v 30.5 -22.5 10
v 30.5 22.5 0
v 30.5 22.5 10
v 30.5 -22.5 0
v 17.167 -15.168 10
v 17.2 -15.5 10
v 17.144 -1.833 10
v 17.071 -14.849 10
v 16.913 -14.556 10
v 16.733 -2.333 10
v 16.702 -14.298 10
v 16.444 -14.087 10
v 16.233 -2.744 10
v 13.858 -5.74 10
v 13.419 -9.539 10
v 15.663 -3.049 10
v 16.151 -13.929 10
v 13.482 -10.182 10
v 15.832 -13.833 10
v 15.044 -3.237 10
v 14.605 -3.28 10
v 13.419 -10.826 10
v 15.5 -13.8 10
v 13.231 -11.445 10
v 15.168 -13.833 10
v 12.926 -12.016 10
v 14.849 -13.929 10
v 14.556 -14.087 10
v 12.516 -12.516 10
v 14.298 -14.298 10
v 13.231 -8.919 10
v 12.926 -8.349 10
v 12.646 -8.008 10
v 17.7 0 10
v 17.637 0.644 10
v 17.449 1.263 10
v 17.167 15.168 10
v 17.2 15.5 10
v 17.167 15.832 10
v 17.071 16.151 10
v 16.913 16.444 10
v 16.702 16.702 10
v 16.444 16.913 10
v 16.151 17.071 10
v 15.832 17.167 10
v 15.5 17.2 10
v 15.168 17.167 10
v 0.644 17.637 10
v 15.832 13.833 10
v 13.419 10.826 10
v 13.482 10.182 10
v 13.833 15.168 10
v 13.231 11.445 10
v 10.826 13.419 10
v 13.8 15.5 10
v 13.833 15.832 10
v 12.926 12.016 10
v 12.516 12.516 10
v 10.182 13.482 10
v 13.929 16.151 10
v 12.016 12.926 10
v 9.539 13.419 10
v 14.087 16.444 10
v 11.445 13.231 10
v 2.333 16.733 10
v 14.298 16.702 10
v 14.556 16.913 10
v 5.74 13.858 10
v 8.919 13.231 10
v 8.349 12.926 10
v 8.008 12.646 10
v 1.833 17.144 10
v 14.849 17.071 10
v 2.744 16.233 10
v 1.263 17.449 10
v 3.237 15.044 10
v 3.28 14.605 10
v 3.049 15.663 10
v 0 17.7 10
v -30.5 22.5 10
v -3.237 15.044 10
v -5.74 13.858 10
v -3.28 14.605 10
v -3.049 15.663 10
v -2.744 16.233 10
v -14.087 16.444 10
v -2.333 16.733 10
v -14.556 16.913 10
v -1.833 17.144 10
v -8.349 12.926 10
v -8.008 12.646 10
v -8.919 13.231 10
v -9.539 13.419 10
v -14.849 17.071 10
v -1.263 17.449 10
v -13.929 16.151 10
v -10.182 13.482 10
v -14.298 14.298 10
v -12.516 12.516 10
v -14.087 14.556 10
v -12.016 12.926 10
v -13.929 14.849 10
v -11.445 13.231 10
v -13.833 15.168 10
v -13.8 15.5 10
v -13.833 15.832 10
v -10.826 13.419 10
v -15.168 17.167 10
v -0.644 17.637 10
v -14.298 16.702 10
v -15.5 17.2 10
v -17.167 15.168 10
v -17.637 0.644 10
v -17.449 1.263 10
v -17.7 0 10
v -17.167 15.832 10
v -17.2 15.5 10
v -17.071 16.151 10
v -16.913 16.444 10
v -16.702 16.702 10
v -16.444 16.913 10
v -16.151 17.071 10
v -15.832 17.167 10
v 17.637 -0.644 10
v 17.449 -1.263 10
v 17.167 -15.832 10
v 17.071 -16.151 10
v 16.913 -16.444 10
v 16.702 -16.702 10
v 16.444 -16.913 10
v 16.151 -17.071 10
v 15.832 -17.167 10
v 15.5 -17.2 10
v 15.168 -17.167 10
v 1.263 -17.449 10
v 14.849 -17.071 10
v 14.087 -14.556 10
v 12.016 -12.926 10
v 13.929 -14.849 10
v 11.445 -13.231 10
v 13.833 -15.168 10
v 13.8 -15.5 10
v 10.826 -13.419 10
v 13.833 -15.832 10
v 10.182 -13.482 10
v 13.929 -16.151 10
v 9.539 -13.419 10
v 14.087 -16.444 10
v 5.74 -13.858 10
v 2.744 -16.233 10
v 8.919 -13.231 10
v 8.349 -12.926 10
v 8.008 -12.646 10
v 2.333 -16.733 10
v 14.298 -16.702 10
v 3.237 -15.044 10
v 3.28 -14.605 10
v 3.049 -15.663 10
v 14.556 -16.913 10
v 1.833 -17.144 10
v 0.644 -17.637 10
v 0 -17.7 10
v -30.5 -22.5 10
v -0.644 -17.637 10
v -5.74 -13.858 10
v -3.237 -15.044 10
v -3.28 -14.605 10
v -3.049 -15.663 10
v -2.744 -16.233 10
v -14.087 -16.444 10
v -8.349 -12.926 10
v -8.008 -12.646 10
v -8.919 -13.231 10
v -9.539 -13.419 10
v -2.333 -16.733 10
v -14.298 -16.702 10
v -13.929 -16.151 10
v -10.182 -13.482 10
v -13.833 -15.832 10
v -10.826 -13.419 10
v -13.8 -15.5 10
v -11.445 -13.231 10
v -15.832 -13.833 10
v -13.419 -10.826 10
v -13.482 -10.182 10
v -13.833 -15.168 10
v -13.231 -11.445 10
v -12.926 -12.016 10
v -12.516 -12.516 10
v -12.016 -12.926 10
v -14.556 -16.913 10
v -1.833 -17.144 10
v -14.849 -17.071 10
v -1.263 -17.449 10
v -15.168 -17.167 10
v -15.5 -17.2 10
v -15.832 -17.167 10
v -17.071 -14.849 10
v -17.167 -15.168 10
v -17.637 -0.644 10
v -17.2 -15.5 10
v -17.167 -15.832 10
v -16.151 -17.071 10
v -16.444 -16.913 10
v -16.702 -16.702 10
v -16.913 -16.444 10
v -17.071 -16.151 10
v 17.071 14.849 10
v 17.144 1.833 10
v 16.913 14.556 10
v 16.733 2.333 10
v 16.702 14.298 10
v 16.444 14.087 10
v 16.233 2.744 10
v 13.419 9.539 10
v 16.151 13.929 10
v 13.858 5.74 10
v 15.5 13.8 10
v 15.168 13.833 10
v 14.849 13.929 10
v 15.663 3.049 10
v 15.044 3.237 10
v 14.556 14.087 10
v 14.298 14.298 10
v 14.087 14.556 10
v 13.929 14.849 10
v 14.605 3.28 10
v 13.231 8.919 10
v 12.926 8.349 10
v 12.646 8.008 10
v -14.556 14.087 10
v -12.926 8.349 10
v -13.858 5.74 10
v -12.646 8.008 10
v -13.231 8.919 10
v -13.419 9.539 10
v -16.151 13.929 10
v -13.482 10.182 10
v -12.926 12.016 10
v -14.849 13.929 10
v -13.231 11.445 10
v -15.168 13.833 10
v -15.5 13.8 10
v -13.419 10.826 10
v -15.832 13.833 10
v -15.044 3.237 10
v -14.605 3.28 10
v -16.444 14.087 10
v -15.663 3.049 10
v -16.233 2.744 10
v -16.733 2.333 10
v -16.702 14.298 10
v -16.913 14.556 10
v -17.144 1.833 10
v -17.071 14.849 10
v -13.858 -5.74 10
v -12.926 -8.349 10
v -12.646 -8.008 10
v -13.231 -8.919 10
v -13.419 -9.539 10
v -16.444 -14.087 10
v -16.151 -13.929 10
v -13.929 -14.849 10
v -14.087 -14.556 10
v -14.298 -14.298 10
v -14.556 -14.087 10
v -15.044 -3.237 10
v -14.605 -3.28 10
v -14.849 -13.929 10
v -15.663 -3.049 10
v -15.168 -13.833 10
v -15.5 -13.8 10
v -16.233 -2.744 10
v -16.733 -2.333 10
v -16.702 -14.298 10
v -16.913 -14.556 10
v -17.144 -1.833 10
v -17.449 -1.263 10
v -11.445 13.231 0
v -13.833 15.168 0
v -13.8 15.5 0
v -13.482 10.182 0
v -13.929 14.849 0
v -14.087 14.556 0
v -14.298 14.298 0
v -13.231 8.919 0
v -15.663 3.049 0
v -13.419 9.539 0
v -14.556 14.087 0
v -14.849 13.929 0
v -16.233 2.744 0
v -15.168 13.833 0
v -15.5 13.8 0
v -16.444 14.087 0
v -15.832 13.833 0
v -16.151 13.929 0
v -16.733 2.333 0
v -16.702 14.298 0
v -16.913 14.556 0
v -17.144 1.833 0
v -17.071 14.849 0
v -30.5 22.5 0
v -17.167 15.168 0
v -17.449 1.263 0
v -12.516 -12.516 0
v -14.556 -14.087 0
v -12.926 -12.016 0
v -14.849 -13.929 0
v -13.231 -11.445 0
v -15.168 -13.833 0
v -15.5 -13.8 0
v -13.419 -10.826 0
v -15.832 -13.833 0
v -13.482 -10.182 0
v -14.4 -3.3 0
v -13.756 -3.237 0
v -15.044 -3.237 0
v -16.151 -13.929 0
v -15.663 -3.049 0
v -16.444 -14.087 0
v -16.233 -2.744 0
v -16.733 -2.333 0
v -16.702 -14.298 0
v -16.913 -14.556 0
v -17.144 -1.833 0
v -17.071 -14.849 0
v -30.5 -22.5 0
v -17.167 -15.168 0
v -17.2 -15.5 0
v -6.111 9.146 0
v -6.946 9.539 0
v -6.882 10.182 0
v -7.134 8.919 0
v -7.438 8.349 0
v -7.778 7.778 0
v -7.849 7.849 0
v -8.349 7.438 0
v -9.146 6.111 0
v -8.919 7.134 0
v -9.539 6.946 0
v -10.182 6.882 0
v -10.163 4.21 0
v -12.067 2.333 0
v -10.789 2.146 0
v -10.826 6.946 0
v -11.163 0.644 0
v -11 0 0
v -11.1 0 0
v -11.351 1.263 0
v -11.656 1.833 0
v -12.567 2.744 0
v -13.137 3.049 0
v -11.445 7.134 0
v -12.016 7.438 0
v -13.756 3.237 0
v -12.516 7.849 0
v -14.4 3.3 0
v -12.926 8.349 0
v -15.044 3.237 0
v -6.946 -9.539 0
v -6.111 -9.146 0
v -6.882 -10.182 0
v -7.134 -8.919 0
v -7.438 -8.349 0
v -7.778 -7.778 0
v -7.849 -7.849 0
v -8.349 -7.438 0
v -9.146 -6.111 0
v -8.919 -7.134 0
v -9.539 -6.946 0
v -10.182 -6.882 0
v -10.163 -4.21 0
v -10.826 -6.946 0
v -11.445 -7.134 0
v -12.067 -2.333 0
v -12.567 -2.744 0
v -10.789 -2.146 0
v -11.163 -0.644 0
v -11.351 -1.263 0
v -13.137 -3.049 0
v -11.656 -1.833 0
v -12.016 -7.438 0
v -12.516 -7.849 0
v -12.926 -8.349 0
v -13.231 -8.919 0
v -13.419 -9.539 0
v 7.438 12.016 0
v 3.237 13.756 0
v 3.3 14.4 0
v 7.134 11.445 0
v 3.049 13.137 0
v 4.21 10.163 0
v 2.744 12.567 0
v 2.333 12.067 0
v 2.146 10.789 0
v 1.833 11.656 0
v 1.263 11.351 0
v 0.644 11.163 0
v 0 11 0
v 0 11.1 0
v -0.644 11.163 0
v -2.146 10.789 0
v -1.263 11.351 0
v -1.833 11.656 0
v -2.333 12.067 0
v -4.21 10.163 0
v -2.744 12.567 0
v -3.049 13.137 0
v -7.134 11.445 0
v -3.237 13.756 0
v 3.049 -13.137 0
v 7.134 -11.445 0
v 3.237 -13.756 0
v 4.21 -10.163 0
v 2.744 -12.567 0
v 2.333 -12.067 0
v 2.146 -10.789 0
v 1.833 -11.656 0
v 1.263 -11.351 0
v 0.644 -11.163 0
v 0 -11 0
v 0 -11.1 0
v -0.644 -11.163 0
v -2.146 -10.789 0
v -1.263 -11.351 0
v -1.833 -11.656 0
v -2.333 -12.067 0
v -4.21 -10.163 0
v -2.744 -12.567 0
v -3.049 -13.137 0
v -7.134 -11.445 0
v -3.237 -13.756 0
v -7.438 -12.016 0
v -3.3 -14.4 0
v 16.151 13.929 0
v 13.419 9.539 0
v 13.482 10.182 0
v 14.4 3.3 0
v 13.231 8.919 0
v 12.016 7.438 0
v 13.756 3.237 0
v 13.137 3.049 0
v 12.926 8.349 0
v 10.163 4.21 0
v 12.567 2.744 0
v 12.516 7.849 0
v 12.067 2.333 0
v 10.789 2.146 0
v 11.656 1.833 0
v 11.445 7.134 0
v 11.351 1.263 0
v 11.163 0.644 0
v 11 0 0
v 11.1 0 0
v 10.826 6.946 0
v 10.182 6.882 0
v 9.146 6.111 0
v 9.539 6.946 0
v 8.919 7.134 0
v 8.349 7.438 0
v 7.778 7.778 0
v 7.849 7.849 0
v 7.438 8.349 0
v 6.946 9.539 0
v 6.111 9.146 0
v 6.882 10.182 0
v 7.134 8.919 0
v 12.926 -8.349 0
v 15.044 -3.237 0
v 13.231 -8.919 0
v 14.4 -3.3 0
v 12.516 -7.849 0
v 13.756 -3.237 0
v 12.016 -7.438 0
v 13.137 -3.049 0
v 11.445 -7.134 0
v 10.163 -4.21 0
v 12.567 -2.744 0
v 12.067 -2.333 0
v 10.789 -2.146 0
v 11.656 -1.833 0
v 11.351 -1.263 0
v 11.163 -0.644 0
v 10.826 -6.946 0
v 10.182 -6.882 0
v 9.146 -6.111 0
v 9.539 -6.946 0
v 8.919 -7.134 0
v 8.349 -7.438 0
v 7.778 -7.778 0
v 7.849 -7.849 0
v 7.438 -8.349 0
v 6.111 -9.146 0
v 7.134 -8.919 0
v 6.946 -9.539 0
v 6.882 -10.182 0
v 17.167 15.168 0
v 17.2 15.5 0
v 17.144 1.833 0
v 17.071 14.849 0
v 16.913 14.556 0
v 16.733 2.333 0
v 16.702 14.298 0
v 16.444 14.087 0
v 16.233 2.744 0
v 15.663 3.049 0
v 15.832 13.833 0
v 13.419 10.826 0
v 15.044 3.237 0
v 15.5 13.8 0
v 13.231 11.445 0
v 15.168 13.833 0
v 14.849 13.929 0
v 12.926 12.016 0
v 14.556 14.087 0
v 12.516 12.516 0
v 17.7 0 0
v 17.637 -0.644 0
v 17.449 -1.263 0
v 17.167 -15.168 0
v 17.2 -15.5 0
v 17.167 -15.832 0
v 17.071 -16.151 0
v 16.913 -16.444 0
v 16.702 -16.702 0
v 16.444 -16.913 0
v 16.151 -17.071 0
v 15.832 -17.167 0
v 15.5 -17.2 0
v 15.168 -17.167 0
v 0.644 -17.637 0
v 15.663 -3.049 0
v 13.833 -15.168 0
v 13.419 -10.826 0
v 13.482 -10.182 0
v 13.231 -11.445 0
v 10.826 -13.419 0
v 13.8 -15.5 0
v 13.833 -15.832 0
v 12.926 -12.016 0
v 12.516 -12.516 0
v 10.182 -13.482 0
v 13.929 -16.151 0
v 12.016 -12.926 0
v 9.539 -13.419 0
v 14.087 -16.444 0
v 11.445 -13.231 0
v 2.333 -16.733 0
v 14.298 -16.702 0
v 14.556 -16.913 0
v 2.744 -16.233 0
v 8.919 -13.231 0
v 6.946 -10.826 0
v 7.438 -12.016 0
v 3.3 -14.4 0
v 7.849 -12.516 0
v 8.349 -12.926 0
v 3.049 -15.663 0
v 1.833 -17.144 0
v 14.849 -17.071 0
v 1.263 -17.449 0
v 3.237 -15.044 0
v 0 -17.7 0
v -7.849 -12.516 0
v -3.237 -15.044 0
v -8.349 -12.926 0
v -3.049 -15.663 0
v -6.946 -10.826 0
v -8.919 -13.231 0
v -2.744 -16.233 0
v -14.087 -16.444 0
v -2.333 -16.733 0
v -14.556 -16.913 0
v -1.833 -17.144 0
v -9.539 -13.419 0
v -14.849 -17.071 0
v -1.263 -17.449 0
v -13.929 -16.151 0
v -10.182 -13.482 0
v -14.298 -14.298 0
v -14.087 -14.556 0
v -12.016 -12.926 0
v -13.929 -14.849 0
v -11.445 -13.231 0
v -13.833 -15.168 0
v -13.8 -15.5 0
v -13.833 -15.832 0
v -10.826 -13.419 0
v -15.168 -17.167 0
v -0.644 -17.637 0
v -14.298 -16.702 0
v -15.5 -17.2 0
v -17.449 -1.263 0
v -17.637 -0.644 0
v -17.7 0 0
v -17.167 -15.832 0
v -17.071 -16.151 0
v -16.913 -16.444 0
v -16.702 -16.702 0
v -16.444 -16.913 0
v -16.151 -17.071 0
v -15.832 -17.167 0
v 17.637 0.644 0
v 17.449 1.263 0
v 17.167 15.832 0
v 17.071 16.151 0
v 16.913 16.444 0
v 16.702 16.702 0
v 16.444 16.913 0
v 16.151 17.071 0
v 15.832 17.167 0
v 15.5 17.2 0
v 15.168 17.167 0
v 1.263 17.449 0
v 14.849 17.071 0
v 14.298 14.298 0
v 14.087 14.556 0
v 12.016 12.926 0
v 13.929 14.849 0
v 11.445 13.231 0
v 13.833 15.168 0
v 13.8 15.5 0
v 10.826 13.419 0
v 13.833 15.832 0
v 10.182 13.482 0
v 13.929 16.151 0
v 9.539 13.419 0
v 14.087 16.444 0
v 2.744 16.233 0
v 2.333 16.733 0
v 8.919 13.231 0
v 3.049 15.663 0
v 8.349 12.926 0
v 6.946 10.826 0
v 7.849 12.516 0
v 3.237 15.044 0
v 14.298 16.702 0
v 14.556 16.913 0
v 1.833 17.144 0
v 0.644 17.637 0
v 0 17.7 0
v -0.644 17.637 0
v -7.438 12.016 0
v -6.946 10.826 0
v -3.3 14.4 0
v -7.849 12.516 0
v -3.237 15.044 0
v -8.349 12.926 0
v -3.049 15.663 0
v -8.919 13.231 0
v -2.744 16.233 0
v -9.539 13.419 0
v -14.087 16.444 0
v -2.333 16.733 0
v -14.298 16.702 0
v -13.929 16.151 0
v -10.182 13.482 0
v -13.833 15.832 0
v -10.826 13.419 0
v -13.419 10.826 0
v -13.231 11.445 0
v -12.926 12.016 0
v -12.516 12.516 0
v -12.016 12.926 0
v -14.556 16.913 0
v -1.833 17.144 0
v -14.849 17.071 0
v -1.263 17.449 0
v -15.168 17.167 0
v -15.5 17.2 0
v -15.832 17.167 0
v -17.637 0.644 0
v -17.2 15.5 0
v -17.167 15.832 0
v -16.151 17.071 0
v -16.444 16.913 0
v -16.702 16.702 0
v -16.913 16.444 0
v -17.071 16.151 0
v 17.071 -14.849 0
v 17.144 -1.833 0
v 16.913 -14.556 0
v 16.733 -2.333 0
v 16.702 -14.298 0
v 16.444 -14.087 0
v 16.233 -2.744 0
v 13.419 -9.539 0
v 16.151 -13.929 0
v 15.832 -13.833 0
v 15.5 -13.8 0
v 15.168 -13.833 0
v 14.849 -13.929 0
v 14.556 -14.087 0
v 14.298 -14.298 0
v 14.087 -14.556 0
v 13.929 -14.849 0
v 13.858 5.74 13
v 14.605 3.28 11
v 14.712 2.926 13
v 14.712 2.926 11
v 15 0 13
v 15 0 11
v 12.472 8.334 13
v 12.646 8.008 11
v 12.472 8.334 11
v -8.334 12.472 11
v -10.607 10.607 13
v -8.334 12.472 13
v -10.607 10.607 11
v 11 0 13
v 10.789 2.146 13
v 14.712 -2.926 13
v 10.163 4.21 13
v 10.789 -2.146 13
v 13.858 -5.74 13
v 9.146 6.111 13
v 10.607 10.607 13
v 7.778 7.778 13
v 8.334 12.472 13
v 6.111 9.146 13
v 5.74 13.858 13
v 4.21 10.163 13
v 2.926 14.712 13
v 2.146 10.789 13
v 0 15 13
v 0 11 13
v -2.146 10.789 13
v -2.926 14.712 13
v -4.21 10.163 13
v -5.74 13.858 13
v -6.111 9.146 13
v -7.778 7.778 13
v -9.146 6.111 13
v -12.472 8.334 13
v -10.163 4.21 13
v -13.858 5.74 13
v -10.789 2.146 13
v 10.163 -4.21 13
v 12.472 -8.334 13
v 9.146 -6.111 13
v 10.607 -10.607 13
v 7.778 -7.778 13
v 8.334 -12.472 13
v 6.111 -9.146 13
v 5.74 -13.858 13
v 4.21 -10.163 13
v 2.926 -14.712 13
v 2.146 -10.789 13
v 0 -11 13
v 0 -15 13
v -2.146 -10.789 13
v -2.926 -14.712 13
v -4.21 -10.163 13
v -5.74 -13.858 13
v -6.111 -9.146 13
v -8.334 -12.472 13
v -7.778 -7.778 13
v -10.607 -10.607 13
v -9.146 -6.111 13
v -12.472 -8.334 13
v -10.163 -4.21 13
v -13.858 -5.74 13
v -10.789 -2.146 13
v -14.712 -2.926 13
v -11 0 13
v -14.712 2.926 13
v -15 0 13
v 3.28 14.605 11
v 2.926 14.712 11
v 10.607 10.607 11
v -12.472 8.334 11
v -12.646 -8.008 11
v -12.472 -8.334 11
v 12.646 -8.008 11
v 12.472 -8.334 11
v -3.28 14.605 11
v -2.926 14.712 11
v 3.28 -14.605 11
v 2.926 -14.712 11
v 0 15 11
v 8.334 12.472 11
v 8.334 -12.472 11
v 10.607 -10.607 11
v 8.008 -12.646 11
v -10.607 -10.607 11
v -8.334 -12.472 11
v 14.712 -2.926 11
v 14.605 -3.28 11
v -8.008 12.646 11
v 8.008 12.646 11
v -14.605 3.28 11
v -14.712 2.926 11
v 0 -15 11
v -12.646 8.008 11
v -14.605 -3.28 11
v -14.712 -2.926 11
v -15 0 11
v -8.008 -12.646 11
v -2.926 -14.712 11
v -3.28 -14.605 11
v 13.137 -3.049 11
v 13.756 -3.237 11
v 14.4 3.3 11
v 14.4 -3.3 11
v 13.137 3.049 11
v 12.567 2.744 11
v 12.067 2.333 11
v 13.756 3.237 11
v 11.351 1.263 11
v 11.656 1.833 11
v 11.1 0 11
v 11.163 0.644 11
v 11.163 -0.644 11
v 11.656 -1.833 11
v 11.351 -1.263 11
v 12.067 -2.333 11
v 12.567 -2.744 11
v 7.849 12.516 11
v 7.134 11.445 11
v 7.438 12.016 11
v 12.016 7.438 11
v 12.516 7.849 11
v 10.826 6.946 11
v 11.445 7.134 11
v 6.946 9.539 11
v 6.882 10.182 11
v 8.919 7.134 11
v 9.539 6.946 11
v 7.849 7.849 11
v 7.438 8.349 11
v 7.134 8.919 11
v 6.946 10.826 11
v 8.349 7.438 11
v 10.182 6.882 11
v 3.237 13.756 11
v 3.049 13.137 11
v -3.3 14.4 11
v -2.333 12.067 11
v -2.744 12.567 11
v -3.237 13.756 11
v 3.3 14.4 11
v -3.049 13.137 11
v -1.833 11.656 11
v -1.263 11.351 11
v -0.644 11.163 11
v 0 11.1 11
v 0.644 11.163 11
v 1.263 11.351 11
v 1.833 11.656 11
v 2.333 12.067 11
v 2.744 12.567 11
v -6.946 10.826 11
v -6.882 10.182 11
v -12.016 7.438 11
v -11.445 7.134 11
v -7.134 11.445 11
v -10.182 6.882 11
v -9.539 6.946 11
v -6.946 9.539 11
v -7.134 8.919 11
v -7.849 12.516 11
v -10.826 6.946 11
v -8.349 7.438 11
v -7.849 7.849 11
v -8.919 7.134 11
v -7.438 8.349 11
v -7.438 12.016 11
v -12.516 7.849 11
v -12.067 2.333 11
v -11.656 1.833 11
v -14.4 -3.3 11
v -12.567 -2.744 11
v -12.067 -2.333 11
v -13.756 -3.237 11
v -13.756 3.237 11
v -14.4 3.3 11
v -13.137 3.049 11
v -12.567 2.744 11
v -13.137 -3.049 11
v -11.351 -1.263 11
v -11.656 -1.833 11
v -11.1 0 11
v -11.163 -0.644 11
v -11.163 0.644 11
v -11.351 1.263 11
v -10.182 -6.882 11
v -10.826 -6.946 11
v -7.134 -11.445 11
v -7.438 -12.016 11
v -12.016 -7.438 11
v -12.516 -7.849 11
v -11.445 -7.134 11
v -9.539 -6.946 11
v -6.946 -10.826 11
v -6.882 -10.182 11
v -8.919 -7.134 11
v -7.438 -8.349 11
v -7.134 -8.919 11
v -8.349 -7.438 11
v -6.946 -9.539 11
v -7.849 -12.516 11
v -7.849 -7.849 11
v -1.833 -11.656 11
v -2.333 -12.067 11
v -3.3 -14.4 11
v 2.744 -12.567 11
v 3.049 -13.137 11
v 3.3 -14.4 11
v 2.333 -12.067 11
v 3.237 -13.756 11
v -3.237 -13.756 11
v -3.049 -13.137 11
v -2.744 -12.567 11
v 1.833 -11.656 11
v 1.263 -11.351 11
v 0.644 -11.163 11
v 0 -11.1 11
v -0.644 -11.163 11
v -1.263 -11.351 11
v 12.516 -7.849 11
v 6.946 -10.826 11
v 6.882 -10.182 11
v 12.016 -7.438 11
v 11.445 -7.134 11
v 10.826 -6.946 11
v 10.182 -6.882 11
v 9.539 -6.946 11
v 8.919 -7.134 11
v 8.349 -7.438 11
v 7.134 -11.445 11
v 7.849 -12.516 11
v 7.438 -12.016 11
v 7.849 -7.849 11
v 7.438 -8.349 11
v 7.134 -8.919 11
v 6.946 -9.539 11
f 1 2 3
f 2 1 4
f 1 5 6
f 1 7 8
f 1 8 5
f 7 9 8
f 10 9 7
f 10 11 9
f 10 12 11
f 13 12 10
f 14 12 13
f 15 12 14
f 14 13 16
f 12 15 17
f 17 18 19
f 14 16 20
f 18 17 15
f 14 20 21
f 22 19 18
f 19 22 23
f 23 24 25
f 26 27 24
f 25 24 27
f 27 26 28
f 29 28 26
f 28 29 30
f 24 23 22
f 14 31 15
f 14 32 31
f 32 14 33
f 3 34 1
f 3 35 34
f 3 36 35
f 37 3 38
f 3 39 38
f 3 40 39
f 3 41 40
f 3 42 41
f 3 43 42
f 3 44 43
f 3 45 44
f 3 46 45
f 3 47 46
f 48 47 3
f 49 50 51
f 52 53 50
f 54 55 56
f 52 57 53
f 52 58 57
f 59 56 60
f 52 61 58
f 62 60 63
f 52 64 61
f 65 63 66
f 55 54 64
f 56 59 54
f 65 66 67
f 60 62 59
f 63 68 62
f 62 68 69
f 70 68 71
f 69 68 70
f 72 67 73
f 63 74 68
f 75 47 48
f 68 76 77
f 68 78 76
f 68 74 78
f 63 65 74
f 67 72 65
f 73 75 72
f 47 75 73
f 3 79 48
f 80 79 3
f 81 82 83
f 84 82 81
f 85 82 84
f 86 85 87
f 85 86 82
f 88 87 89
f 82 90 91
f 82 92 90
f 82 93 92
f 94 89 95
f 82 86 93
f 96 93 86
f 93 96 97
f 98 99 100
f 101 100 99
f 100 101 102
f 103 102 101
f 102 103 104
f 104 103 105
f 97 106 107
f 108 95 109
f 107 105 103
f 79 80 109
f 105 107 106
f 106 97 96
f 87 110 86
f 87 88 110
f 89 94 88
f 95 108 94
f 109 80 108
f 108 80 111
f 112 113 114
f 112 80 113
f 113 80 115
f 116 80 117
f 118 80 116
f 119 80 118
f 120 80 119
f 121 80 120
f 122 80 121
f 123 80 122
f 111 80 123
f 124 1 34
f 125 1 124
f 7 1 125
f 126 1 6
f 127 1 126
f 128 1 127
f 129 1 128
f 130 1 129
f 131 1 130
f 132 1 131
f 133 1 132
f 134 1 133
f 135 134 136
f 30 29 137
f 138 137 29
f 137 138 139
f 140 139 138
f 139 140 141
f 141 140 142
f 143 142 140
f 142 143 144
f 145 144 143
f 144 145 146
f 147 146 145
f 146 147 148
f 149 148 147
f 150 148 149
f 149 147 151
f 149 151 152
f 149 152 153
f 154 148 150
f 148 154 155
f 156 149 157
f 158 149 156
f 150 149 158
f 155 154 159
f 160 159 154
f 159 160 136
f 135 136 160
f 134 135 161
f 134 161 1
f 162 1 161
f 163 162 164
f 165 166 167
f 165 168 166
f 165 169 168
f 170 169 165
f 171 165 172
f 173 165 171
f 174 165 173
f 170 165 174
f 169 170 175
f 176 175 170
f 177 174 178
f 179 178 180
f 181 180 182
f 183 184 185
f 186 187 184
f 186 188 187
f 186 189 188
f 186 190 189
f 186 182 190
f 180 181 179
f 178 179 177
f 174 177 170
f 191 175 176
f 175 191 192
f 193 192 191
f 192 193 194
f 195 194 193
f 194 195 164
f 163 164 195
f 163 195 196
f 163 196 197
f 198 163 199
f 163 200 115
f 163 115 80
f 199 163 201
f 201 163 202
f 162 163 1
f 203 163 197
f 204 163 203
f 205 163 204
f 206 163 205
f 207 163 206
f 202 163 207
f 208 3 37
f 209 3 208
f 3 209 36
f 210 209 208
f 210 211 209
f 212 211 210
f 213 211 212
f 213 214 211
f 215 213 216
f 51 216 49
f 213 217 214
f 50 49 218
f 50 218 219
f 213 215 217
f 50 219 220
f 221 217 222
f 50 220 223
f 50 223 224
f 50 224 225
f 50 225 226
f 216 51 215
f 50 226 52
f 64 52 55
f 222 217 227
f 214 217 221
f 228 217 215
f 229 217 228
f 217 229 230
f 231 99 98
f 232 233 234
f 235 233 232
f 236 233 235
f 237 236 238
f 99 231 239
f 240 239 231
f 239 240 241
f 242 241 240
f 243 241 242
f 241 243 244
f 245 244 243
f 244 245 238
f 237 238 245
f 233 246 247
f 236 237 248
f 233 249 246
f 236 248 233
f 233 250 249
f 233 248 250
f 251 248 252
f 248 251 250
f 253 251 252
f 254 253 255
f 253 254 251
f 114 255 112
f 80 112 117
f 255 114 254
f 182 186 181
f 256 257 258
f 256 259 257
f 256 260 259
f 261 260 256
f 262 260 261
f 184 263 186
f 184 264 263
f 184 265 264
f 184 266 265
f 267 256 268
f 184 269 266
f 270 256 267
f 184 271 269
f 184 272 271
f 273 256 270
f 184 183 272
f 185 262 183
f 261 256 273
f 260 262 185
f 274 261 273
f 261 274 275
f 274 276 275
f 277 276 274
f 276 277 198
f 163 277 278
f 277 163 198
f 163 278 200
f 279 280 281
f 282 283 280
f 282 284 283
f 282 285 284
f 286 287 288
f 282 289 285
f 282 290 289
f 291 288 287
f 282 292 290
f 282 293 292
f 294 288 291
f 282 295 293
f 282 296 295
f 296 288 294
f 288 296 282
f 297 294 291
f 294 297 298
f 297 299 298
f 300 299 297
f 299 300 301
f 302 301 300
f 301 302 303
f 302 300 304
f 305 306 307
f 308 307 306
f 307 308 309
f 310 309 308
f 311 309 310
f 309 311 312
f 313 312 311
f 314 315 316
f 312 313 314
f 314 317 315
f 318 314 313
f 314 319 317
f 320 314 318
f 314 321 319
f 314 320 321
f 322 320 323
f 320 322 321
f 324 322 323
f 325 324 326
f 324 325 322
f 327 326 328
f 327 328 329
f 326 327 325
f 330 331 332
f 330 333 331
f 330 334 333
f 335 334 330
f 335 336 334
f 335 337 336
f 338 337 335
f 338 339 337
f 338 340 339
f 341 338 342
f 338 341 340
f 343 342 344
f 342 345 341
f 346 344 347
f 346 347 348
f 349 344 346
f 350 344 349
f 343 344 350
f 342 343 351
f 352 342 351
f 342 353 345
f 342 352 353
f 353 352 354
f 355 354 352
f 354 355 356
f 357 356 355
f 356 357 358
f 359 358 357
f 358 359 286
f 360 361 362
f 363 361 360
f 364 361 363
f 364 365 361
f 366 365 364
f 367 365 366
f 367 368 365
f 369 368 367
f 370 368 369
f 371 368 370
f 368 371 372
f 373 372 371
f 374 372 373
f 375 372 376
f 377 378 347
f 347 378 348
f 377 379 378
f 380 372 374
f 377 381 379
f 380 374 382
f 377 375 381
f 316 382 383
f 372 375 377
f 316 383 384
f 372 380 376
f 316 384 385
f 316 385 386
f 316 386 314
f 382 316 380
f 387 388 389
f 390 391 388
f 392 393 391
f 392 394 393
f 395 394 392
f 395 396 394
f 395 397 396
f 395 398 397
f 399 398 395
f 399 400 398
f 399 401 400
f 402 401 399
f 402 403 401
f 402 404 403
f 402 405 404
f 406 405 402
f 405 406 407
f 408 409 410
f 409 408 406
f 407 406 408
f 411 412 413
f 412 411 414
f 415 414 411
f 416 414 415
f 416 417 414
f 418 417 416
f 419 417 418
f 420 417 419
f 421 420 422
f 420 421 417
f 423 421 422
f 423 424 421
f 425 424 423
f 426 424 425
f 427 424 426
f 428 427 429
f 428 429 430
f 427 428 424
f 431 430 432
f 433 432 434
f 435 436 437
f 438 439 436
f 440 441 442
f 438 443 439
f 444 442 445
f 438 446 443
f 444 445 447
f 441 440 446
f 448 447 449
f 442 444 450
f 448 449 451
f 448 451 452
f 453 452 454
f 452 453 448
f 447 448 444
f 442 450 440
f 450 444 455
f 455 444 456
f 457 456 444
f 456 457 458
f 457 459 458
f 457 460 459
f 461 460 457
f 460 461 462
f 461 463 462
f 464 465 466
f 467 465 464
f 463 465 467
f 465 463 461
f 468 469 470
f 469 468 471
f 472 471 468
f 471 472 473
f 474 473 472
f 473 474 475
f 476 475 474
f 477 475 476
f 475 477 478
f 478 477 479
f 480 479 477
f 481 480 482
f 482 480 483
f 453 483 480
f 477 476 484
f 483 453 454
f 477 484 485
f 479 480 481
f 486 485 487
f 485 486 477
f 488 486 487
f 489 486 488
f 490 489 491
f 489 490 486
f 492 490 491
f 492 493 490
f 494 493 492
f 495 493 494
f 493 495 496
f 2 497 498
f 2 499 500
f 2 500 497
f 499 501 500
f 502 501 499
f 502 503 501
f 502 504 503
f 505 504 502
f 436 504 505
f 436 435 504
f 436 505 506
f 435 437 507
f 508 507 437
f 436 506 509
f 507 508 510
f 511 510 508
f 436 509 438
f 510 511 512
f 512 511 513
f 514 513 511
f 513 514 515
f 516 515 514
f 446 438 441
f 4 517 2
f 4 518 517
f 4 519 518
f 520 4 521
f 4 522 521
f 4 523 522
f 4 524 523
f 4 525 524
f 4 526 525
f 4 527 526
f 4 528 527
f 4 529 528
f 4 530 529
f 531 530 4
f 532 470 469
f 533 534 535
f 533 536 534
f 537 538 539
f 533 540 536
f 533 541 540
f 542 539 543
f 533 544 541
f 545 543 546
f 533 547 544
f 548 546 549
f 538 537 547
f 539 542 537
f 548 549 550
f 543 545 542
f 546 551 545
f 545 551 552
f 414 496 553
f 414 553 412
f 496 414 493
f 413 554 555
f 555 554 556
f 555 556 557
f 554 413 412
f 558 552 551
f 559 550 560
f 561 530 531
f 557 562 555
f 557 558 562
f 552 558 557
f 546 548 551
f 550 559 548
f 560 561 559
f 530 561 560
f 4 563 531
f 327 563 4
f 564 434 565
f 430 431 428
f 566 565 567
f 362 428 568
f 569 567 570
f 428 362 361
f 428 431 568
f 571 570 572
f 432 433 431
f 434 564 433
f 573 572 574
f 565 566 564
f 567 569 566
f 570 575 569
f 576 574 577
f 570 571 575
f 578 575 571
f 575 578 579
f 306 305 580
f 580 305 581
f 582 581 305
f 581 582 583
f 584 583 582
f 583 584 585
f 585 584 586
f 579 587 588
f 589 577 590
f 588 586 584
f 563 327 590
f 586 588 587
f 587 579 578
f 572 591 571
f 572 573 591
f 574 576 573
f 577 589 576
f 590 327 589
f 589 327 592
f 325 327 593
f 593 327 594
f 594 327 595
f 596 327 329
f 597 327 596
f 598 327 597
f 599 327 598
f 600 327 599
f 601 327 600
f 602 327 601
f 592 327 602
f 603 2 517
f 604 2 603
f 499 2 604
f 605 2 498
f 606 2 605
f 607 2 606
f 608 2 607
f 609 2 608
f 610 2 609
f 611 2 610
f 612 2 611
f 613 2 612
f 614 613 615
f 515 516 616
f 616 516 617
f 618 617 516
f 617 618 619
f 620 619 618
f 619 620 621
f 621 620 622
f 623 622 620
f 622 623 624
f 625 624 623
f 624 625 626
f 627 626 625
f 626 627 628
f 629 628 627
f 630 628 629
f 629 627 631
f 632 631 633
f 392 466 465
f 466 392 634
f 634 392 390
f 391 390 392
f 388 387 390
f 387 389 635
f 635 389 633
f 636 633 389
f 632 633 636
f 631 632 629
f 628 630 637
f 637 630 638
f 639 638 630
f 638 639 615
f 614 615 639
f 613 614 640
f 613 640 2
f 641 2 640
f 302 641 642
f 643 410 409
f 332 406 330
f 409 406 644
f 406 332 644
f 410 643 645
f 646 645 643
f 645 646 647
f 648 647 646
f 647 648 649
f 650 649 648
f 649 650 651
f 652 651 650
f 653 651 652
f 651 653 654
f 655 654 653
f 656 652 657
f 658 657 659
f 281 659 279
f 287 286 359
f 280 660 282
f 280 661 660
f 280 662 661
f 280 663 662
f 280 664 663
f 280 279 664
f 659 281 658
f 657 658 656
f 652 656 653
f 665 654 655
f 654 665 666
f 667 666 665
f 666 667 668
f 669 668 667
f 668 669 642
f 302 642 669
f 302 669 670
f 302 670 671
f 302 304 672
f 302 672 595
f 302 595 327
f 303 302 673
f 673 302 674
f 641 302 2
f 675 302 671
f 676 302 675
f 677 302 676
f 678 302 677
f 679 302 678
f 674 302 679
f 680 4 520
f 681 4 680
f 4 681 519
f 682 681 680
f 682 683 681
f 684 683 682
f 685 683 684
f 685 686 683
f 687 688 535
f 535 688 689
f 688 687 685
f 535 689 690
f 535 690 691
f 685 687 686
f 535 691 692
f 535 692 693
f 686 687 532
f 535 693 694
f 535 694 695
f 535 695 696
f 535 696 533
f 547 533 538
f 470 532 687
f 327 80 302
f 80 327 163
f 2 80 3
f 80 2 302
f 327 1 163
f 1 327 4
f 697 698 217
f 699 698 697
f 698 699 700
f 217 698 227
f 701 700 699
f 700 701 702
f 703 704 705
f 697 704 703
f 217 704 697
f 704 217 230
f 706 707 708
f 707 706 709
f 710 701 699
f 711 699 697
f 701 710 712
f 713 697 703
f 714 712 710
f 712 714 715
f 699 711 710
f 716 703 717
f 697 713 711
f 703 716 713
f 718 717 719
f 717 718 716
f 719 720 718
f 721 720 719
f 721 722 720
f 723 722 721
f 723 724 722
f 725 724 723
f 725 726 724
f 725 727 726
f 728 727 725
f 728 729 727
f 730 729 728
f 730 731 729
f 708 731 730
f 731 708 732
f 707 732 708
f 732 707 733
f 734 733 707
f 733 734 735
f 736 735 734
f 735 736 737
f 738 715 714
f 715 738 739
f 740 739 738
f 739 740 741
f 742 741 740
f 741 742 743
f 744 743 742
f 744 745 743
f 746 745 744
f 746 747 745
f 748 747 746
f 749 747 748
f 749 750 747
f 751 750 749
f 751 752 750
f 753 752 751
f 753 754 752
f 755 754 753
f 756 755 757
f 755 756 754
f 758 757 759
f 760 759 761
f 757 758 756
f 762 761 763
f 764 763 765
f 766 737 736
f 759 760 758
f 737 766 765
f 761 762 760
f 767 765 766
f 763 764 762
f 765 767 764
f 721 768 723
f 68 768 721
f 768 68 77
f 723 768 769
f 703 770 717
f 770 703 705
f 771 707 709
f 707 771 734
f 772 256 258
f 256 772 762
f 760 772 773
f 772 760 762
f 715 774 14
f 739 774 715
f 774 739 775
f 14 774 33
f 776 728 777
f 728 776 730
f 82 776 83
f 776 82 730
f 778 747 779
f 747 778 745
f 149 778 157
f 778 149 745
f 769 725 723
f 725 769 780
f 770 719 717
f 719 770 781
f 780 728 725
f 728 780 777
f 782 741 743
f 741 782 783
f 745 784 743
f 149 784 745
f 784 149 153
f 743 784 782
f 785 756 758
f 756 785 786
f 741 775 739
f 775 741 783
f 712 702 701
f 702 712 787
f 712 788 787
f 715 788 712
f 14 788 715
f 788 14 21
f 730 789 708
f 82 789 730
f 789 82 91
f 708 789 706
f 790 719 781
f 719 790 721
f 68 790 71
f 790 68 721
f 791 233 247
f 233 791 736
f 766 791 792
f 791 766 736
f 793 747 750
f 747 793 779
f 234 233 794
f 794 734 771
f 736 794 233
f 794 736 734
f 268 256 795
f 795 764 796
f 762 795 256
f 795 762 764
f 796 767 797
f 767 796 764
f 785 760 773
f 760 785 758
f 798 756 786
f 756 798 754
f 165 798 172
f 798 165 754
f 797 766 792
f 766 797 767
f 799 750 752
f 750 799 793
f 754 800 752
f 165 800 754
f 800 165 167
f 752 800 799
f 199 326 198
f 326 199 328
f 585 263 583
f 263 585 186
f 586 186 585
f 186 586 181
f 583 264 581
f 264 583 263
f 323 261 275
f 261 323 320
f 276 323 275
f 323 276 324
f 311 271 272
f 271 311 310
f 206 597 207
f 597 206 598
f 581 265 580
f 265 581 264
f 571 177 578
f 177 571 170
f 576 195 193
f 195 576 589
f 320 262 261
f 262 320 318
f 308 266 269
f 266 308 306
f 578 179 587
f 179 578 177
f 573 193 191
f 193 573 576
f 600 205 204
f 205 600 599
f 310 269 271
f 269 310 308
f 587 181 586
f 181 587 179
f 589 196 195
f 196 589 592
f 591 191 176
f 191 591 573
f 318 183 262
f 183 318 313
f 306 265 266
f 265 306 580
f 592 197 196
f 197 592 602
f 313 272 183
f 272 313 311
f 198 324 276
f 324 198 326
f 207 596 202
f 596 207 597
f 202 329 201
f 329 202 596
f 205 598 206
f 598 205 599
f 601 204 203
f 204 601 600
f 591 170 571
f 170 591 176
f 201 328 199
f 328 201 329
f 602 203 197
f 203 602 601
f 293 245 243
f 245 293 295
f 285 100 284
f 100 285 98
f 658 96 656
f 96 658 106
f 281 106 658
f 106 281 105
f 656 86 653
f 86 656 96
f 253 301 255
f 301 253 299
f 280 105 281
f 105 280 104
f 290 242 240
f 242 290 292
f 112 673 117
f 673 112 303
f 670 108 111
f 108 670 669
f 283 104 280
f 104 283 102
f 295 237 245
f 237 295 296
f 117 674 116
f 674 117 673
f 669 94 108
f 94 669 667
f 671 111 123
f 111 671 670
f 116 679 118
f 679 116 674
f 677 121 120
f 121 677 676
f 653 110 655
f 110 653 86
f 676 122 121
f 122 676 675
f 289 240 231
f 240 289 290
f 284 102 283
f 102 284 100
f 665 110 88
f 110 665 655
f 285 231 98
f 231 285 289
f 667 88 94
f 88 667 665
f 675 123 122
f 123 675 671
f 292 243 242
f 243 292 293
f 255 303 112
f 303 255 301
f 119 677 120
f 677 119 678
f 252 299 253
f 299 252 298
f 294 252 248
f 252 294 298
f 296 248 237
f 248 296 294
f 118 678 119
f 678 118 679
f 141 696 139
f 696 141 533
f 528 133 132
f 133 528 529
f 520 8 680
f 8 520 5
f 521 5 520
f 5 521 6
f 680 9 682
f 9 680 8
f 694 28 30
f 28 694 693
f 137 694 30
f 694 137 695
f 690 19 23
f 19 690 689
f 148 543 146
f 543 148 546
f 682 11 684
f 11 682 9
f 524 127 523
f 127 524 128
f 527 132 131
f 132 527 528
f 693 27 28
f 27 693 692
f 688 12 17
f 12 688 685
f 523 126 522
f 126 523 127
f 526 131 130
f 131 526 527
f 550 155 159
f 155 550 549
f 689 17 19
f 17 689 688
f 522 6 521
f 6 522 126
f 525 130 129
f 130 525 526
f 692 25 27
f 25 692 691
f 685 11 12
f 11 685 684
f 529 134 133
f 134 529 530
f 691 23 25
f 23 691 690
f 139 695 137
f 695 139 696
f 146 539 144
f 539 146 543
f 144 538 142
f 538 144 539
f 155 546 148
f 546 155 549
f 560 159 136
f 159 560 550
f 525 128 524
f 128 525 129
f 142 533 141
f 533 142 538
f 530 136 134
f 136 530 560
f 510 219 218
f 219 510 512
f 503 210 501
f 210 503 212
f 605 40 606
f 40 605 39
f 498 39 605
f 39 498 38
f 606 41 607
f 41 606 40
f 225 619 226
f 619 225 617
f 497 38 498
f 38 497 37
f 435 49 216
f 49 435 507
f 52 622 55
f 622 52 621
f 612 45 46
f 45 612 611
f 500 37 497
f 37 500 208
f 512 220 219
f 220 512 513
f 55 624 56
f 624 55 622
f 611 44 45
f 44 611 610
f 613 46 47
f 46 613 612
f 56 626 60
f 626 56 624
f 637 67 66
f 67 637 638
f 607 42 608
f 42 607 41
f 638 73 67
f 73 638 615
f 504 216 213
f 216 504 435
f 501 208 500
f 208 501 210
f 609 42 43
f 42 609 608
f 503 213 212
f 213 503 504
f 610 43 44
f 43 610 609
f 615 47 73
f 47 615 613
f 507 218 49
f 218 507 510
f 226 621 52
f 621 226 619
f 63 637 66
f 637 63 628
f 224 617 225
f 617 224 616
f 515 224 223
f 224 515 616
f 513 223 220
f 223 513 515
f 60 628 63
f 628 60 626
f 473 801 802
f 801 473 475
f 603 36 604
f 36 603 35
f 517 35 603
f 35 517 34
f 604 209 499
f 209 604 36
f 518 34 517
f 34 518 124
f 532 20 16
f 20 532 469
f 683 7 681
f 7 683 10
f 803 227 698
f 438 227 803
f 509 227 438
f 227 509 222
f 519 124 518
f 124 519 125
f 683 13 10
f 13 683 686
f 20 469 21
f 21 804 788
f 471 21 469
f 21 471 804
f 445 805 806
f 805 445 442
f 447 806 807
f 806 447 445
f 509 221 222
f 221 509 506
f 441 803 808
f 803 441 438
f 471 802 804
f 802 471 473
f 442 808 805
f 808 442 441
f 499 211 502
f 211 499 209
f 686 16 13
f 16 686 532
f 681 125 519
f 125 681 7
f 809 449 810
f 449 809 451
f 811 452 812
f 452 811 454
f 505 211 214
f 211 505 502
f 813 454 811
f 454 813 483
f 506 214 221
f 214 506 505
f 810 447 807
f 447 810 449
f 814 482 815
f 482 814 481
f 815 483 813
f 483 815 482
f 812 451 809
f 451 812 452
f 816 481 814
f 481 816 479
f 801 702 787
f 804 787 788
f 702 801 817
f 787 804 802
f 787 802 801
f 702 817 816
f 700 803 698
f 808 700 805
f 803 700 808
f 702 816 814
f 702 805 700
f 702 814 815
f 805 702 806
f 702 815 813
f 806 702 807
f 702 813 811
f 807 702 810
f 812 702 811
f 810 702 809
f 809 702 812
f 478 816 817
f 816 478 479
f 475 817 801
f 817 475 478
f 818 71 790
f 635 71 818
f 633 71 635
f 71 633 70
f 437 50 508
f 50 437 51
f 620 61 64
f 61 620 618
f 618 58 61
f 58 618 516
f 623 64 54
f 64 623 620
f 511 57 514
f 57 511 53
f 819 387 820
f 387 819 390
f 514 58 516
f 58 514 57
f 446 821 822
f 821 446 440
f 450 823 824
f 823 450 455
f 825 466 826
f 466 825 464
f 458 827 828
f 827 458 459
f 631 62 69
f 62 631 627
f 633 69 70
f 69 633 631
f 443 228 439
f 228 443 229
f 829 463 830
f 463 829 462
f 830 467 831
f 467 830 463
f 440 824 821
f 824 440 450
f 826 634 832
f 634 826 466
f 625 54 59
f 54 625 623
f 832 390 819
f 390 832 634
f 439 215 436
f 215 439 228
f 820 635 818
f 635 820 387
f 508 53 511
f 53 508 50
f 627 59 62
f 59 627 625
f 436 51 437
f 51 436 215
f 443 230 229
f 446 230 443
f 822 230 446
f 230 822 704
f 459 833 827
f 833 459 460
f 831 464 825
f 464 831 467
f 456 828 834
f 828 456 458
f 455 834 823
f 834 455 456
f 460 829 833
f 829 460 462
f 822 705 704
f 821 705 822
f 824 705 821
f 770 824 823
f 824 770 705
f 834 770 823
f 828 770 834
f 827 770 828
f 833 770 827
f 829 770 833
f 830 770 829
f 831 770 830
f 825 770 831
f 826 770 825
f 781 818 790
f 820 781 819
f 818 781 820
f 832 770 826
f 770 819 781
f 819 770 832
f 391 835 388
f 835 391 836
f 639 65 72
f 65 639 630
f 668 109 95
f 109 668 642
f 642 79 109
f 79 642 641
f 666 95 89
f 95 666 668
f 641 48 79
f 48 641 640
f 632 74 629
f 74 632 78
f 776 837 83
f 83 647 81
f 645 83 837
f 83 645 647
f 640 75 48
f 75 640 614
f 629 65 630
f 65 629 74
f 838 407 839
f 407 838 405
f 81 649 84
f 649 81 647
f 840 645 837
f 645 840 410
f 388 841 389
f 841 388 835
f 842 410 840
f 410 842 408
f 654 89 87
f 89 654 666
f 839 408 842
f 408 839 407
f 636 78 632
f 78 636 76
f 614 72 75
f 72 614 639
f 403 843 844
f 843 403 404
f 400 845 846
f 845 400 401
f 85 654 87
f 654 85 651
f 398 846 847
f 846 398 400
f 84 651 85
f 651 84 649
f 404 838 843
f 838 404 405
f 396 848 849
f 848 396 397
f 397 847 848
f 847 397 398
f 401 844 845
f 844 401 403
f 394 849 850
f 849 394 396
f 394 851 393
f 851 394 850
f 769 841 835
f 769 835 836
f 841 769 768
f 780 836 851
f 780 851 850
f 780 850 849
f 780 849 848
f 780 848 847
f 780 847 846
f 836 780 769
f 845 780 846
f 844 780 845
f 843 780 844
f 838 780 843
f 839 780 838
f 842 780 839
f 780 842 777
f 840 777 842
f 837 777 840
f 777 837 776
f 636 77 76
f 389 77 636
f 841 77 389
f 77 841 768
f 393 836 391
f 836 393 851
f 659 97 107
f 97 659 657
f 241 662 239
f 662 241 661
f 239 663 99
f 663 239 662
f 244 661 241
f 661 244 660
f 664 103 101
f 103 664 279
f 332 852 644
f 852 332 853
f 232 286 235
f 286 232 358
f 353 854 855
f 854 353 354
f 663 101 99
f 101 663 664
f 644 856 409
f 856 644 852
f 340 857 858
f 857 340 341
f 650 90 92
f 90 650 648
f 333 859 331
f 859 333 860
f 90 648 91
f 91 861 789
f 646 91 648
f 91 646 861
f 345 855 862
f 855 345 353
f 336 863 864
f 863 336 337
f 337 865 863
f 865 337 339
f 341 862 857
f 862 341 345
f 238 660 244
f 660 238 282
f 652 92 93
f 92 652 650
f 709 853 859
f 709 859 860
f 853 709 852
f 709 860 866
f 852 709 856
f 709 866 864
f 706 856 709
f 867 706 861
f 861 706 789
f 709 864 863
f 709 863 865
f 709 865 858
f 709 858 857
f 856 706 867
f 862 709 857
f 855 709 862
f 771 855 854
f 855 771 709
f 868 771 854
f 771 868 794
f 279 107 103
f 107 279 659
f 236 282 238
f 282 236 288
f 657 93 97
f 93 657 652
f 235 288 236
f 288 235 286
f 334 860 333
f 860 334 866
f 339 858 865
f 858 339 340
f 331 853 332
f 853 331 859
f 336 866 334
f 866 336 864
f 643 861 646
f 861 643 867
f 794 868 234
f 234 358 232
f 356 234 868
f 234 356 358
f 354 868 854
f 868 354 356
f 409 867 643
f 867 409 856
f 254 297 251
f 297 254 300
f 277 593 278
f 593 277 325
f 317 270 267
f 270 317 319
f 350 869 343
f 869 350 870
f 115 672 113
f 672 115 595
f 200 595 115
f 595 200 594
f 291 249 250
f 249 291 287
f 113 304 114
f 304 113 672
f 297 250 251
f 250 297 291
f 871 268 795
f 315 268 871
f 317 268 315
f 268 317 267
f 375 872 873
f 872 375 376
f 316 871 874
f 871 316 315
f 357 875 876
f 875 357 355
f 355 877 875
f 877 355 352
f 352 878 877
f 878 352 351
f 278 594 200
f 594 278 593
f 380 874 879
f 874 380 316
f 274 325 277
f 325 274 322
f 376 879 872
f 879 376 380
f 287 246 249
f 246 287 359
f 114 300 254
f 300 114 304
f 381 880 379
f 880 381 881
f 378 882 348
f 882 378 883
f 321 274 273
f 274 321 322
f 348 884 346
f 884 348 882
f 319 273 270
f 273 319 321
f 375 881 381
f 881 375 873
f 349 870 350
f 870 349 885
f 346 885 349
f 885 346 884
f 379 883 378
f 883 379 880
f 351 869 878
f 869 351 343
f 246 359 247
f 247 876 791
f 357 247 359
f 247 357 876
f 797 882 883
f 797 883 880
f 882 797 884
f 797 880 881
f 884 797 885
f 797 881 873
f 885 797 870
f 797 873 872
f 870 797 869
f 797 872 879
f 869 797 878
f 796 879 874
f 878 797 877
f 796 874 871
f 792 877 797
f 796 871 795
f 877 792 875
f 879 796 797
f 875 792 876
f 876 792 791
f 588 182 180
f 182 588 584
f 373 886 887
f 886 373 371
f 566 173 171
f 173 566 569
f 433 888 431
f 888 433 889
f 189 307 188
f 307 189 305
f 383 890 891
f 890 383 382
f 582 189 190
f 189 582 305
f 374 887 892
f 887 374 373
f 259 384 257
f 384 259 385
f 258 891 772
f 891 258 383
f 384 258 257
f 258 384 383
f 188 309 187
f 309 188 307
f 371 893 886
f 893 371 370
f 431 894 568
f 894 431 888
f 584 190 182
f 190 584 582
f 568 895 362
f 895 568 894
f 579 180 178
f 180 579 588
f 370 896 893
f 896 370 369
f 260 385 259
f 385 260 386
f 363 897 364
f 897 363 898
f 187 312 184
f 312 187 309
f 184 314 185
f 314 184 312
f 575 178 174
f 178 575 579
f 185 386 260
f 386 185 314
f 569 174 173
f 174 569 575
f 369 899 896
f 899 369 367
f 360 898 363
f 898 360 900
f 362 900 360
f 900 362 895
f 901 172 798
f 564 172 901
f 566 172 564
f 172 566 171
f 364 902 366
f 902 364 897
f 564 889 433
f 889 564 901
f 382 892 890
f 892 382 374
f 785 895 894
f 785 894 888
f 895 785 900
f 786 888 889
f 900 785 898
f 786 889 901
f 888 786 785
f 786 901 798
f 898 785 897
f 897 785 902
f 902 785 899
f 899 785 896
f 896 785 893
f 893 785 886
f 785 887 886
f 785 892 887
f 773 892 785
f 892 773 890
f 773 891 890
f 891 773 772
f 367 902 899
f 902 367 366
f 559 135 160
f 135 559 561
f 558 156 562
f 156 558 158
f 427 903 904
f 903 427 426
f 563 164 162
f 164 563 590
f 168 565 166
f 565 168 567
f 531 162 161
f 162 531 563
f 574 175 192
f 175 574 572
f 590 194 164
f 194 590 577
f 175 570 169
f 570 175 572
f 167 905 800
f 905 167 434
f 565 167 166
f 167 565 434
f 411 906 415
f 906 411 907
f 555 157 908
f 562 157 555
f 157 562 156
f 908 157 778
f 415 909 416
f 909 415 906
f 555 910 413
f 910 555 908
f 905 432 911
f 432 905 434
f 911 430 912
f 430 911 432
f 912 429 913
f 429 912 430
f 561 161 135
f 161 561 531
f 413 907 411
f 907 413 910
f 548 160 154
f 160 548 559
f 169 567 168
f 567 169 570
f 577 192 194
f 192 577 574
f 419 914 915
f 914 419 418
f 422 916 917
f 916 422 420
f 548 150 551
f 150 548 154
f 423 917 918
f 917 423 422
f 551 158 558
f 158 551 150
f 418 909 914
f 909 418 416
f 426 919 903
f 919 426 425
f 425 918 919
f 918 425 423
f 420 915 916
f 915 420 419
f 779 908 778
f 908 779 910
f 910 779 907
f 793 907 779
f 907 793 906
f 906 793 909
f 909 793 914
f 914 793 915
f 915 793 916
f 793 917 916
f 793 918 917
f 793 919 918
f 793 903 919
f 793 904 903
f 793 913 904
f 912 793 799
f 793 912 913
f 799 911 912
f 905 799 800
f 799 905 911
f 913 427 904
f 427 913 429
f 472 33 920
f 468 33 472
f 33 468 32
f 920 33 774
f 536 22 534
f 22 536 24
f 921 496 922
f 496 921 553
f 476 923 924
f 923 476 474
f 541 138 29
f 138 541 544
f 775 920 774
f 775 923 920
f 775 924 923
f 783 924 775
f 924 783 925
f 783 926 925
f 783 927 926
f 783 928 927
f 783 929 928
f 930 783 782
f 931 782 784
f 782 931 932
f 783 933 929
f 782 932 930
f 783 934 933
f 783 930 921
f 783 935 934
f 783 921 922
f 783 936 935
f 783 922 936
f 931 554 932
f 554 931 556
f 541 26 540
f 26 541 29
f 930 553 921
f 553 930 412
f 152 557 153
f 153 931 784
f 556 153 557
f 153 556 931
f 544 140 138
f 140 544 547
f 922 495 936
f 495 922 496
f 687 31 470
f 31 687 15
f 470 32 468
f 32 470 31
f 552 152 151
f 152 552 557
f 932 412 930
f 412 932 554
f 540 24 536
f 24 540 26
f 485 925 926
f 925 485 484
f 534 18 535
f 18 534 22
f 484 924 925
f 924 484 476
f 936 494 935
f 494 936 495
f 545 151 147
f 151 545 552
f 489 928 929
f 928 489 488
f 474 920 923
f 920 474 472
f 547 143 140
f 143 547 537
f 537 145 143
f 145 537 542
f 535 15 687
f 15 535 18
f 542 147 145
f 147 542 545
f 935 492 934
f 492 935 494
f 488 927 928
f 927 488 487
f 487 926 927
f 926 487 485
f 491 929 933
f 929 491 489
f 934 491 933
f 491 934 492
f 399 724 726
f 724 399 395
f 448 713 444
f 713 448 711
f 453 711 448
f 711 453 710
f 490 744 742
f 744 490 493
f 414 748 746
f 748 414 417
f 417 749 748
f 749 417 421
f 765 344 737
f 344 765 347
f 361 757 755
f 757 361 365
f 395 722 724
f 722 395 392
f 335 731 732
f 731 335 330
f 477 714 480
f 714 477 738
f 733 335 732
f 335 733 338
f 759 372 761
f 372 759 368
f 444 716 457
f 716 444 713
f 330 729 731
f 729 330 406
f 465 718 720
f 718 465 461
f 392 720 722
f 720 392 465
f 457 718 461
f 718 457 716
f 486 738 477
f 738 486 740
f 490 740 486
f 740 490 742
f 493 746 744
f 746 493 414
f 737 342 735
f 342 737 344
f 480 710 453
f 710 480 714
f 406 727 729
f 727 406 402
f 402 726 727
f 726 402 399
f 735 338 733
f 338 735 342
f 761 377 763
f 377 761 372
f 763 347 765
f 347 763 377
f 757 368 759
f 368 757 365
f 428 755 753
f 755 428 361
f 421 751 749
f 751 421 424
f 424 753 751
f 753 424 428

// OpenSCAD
$fn = 32;
// ----------------------------------------------------------------------
// Motor mount plate: NEMA17, 61 x 45 x 13 mm
// ----------------------------------------------------------------------

// --- parameters (mm) ---
plate_w = 61;             // plate length, X
plate_d = 45;             // plate width, Y
plate_t = 10;             // plate thickness
pattern = 31;             // NEMA17 bolt spacing
motor_d = 3.4;            // NEMA17 screw clearance
pilot_d = 22;             // pilot boss bore
boss_d = 30;              // raised pilot ring
boss_h = 3;               // raised pilot ring height
second_d = 6.6;           // second fastener hole
bc_r = 14.4;              // second bolt circle radius
bc_n = 8;                 // second bolt circle count

module plate() {
  translate([-plate_w / 2, -plate_d / 2, 0]) cube([plate_w, plate_d, plate_t]);
}

module motor_holes() {
  for (sx = [-1, 1]) for (sy = [-1, 1])
    translate([sx * pattern / 2, sy * pattern / 2, -1])
      cylinder(h = plate_t + 2, d = motor_d);
}
module pilot_ring() {
  translate([0, 0, plate_t - 1]) cylinder(h = boss_h + 1, d = boss_d);
}

difference() {
  union() {
    plate();
    pilot_ring();
  }
  motor_holes();
  translate([0, 0, -1]) cylinder(h = plate_t + boss_h + 2, d = pilot_d);
  for (i = [0 : bc_n - 1]) rotate([0, 0, i * 360 / bc_n]) translate([bc_r, 0, -1])    cylinder(h = plate_t + 2, d = second_d);
}
